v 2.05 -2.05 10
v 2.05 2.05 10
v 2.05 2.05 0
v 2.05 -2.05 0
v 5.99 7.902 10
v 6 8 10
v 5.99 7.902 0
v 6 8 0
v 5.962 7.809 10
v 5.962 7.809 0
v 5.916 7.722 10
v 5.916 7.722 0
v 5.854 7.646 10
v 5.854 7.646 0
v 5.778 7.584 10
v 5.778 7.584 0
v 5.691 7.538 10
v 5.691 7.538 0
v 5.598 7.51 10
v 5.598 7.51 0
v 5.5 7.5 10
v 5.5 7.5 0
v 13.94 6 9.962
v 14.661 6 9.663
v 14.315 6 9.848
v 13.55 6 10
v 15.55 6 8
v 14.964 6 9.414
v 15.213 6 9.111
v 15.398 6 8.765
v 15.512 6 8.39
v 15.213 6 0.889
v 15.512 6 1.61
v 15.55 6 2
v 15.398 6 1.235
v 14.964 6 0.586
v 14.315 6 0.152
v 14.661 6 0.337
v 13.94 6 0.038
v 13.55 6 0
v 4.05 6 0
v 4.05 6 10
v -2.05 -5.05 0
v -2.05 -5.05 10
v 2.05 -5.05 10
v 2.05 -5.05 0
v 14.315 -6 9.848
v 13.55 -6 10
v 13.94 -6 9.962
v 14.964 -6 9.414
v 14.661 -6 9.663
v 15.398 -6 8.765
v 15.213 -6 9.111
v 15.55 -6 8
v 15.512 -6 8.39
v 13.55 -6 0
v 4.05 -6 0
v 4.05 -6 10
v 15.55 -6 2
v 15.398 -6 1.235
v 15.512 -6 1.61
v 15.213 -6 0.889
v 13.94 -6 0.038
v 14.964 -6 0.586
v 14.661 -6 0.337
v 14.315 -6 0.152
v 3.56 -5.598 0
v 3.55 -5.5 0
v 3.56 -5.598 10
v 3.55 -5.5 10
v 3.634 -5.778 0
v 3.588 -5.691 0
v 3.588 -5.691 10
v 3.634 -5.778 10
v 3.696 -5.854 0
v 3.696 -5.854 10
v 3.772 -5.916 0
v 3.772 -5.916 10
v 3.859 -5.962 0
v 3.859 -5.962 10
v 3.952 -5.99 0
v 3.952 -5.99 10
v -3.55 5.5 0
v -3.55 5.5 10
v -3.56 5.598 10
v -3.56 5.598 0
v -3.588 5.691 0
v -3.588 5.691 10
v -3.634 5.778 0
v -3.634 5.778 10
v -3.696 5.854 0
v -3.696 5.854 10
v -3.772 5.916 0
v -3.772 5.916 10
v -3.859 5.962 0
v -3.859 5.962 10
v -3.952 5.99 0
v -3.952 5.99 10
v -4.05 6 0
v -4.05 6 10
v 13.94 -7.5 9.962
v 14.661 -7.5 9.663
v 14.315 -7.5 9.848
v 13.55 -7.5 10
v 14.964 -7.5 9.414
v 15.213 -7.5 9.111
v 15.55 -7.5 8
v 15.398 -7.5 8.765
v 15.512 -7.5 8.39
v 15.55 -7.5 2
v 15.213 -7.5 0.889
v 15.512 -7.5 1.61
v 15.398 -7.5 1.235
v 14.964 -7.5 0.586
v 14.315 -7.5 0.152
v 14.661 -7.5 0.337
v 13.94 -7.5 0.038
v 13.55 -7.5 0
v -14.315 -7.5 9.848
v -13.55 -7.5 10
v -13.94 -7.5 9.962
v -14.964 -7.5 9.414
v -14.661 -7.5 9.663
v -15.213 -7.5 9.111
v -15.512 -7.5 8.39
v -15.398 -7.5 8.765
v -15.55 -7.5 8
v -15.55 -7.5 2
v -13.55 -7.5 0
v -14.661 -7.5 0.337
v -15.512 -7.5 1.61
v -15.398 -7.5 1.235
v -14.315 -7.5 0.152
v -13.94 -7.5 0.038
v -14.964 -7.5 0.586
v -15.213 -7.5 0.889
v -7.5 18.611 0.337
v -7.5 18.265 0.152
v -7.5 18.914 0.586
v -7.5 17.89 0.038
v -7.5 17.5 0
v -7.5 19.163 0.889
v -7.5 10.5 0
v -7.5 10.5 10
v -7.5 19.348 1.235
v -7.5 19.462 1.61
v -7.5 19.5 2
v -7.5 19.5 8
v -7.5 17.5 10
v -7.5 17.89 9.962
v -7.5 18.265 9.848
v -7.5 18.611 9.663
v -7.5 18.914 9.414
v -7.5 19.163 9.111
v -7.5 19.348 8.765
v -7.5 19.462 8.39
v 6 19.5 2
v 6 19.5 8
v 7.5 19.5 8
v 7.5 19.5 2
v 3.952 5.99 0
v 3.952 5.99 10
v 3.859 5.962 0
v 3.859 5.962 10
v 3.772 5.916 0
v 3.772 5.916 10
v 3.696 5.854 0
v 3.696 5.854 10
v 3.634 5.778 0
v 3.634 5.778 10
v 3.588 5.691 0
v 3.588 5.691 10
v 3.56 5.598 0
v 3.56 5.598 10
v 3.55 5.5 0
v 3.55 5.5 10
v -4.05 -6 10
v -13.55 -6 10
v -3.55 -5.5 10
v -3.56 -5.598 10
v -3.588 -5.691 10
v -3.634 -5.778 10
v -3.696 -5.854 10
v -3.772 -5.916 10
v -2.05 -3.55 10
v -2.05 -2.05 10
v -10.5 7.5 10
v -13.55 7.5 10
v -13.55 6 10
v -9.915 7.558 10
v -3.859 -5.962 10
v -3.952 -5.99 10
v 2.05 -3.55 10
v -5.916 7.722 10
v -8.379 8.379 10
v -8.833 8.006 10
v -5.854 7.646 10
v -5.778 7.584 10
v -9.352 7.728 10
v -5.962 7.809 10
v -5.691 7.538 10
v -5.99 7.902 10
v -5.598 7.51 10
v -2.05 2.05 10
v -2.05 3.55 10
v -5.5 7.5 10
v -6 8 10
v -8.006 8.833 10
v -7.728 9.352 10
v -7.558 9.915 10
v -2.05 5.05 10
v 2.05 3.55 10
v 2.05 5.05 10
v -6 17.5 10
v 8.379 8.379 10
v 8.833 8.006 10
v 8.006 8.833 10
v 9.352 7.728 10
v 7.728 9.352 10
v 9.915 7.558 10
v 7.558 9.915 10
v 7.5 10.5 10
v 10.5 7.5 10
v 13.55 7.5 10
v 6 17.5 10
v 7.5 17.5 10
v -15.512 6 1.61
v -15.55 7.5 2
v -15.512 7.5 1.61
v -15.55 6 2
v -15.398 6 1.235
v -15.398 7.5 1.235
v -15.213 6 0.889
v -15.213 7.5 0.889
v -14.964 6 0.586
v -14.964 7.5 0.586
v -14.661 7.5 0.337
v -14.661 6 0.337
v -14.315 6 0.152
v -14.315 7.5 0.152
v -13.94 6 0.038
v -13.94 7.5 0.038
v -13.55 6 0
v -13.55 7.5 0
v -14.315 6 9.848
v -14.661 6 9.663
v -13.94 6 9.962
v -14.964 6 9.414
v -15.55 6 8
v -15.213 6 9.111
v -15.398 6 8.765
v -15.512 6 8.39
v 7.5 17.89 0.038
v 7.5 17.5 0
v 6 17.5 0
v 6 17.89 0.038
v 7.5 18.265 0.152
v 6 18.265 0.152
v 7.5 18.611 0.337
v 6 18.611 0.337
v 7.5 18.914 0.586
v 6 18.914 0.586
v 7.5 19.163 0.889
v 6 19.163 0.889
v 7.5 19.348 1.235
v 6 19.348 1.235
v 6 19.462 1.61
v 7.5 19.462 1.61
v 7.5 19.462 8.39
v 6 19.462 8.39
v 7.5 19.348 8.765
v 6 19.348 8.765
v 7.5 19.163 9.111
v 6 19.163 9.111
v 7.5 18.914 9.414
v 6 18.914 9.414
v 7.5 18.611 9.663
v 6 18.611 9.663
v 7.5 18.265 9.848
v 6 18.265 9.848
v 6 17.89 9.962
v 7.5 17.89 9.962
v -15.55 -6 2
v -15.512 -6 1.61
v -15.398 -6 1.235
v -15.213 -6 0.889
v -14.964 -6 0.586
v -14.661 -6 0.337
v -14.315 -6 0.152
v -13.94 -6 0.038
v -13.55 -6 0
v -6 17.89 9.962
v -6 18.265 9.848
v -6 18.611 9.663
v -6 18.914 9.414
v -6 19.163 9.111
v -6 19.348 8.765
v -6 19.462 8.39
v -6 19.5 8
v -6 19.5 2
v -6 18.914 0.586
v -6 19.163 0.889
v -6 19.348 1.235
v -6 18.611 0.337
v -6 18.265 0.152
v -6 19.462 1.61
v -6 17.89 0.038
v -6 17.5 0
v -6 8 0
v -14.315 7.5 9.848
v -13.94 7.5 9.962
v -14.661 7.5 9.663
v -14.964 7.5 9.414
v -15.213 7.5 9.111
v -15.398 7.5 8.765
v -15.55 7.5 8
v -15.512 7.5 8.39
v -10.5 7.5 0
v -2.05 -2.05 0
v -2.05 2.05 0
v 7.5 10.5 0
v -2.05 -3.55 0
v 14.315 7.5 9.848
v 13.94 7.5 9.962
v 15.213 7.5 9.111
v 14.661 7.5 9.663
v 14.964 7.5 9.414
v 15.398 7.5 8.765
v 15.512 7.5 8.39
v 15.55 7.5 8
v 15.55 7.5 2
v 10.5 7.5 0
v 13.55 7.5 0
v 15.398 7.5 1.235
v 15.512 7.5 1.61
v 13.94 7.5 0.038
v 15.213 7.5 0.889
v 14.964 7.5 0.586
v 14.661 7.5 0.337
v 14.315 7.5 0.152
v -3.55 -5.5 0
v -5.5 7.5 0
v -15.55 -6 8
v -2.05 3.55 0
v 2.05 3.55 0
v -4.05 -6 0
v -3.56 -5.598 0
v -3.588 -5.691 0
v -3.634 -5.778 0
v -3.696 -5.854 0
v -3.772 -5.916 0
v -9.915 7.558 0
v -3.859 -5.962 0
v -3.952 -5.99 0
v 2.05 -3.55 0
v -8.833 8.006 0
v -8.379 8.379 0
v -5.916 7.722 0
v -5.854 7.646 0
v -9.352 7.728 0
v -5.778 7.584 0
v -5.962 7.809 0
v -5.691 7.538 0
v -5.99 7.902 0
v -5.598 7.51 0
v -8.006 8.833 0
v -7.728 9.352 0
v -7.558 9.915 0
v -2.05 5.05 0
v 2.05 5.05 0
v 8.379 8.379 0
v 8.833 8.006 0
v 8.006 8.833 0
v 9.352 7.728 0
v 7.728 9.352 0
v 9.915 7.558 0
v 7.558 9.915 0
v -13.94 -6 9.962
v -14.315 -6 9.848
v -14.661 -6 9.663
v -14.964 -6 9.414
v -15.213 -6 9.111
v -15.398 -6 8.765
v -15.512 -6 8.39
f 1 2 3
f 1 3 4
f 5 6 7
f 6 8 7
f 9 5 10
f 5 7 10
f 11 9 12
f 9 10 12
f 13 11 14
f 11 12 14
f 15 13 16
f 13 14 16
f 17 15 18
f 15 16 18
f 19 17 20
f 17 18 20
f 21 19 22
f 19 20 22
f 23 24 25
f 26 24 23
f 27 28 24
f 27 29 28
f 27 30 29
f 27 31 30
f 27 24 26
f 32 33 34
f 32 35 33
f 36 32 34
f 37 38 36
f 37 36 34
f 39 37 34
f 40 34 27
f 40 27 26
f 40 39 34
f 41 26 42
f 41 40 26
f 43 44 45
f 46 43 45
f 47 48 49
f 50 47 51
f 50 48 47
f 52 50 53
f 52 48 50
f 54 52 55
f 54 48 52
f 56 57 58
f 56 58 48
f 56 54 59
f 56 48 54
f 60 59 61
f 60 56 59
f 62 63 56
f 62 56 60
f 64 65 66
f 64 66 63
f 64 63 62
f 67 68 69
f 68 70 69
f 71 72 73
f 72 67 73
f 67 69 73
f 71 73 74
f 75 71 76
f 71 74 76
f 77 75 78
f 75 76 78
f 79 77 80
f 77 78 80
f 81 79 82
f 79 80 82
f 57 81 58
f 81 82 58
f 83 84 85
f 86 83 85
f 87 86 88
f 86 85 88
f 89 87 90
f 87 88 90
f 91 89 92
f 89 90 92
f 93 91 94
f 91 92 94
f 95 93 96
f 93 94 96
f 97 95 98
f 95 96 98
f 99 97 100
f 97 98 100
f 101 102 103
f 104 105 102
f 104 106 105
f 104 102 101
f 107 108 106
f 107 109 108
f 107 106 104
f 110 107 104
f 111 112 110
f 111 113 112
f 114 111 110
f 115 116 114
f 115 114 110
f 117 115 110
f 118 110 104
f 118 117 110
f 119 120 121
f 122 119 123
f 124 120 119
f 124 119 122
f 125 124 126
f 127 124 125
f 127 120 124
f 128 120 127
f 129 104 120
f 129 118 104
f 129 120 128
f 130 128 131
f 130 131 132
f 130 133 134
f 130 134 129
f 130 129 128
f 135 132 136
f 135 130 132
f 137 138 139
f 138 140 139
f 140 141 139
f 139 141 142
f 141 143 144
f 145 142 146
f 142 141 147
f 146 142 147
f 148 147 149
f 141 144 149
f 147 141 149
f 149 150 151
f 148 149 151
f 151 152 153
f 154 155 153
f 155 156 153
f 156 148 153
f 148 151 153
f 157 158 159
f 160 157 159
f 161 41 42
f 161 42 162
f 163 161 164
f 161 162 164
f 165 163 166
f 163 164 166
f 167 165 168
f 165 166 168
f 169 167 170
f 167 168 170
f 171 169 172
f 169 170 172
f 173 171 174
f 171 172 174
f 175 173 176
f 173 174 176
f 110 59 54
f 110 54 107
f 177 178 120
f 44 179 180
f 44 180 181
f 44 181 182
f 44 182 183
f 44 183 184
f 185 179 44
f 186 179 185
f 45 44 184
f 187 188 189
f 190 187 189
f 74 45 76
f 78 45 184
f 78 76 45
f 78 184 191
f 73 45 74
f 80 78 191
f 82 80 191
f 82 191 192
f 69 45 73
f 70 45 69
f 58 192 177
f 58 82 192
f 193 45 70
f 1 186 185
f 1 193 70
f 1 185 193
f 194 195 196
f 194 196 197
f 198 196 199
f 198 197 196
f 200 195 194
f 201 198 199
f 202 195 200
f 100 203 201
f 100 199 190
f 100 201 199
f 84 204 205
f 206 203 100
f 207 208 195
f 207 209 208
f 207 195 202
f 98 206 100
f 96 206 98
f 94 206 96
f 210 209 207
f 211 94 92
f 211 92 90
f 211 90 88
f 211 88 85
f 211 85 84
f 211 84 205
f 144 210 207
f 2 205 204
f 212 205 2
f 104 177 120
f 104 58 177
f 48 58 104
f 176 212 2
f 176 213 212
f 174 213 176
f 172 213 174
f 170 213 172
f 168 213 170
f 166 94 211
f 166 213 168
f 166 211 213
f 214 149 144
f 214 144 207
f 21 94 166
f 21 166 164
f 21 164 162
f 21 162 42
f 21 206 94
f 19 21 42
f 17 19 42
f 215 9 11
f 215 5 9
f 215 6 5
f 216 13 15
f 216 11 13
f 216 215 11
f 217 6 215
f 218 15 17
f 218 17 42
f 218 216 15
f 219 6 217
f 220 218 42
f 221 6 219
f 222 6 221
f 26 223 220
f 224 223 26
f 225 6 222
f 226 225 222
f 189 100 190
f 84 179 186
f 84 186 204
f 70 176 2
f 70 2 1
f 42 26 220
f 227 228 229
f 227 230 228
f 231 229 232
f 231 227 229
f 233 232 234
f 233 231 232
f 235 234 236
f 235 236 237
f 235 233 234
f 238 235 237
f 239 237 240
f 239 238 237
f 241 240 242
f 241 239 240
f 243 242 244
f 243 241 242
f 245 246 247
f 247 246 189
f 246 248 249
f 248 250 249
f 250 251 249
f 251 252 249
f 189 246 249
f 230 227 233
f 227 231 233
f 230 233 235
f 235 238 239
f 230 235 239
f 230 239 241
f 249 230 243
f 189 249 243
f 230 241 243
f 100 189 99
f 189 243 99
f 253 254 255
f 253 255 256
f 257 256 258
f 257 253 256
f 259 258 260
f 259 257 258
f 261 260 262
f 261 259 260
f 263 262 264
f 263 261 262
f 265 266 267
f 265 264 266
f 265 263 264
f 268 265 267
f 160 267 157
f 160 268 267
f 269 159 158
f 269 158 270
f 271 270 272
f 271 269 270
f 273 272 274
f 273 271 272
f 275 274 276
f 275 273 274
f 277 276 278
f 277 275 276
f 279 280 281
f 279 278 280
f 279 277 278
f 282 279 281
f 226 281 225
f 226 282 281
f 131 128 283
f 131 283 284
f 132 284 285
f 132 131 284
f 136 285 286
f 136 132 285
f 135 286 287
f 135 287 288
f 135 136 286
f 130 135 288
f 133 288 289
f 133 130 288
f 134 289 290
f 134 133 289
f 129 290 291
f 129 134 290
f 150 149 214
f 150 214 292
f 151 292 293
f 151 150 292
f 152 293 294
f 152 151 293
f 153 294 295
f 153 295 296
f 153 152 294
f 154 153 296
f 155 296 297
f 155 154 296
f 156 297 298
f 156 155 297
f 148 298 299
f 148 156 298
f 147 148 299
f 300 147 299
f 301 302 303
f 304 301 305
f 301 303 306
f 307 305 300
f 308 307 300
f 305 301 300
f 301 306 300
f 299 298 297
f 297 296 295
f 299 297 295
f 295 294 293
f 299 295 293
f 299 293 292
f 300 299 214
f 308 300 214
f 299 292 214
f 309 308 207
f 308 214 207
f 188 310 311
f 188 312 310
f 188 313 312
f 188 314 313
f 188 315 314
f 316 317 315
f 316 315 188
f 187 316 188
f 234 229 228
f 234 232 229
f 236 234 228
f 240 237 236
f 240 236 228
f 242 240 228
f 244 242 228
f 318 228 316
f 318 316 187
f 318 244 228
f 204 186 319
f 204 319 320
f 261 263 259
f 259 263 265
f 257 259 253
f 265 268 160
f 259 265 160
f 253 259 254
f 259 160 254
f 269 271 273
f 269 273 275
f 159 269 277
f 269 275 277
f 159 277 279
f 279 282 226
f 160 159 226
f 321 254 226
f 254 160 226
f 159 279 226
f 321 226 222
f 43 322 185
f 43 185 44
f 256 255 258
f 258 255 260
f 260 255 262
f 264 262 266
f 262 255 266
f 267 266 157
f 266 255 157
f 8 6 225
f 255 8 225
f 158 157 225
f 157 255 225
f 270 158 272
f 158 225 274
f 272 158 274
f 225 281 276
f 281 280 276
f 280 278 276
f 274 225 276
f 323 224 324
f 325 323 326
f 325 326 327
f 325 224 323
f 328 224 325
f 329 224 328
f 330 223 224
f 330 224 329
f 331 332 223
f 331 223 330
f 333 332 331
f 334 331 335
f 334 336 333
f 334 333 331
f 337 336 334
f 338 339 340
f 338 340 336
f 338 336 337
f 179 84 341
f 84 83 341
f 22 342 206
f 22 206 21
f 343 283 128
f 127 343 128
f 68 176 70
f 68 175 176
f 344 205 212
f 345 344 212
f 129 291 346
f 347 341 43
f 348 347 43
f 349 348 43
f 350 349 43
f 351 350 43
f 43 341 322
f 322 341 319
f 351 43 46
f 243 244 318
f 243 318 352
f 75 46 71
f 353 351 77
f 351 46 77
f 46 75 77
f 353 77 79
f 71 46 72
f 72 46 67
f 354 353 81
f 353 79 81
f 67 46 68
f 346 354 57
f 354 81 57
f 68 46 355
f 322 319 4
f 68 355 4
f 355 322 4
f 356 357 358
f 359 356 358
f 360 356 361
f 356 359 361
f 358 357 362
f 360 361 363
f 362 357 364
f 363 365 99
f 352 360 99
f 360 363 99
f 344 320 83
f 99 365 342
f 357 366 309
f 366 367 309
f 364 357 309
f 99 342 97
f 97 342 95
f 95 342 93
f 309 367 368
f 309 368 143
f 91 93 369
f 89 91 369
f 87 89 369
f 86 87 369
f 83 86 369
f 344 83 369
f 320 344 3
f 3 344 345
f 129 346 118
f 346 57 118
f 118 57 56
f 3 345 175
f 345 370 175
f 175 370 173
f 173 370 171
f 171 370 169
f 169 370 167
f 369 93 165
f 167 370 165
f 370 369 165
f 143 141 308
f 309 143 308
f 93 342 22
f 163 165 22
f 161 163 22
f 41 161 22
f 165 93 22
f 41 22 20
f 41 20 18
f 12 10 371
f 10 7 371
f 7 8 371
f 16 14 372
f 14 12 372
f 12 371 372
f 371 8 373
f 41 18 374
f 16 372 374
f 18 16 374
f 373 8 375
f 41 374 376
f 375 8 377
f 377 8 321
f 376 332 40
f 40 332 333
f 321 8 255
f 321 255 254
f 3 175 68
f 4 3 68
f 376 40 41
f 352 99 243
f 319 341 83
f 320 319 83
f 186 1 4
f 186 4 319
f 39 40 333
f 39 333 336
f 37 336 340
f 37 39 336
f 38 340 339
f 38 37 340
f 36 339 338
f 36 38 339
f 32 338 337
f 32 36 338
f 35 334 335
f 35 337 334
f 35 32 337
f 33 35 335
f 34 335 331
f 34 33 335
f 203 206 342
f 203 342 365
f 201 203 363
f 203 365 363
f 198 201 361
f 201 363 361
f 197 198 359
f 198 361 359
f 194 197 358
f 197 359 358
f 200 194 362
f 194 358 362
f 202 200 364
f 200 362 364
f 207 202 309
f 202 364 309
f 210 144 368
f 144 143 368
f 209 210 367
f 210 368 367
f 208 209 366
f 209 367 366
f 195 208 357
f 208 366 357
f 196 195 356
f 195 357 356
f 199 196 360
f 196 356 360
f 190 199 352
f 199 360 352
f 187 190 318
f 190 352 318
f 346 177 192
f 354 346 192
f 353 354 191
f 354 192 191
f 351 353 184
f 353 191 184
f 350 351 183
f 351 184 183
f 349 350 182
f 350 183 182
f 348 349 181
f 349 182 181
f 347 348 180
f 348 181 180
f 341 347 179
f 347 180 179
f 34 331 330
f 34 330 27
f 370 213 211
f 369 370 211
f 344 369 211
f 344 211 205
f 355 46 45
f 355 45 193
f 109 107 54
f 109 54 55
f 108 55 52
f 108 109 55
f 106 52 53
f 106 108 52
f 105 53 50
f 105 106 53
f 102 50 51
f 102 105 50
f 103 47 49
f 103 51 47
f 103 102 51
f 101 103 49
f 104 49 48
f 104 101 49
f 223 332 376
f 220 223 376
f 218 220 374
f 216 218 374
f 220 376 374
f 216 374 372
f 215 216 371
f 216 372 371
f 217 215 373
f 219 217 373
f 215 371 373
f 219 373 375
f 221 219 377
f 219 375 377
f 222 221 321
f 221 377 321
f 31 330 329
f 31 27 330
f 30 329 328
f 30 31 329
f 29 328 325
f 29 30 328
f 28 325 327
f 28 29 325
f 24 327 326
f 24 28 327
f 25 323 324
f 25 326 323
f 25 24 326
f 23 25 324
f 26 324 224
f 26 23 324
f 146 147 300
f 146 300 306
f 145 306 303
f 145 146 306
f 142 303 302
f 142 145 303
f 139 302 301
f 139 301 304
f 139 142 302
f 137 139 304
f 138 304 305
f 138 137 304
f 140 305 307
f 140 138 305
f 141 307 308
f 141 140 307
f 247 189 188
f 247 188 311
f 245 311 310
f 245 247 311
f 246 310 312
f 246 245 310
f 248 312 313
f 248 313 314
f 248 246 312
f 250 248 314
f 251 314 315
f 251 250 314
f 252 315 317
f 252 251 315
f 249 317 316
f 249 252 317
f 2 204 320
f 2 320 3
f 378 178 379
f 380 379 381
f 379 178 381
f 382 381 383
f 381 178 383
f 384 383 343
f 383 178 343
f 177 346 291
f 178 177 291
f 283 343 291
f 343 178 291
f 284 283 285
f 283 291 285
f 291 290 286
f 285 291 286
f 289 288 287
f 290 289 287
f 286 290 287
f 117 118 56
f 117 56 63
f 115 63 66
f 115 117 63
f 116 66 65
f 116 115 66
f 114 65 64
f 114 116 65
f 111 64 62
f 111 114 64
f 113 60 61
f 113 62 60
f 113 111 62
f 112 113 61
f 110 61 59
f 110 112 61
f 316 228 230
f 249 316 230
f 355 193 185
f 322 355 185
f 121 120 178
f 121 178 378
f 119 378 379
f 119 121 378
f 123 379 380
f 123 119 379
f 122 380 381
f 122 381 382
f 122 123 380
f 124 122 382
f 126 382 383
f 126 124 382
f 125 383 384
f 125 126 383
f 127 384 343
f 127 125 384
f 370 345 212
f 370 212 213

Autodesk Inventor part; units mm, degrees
ref_plane "XZ Plane" through (0, 0, 0) normal (0, 1, 0) x (-1, 0, 0)
sketch "Sketch1" plane through (0, 0, 0) normal (0, 0, 1) x (1, 0, 0)
  line L0 (-2.05, 2.05) -> (2.05, 2.05)
  line L1 (2.05, 2.05) -> (2.05, -2.05)
  line L2 (2.05, -2.05) -> (-2.05, -2.05)
  line L3 (-2.05, -2.05) -> (-2.05, 2.05)
  line L4 (0, 2.05) -> (0, -2.05) construction
  line L5 (0, 7.5) -> (-15.55, 7.5)
  line L6 (-15.55, 7.5) -> (-15.55, 6)
  line L7 (-15.55, 6) -> (-3.55, 6)
  line L8 (-3.55, 6) -> (-3.55, -6)
  line L9 (-3.55, -6) -> (-15.55, -6)
  line L10 (-15.55, -6) -> (-15.55, -7.5)
  line L11 (-15.55, -7.5) -> (-0.55, -7.5)
  line L12 (-2.05, 0) -> (2.05, 0) construction
  line L13 (0, 7.5) -> (15.55, 7.5)
  line L14 (15.55, 7.5) -> (15.55, 6)
  line L15 (15.55, 6) -> (3.55, 6)
  line L16 (3.55, 6) -> (3.55, -6)
  line L17 (3.55, -6) -> (15.55, -6)
  line L18 (15.55, -6) -> (15.55, -7.5)
  line L19 (15.55, -7.5) -> (-0.55, -7.5)
  line L20 (-2.05, 2.05) -> (2.05, -2.05) construction
  line L21 (2.05, 2.05) -> (-2.05, -2.05) construction
  line L22 (0, 7.5) -> (0, 2.05) construction
  point P0 (0, 0)
  point P1 (0, 0)
  point P2 (0, 0)
  dimension "d3" = 4.1
  dimension "d4" = 4.1
  dimension "d5" = 12
  dimension "d6" = 1.5
  dimension "d7" = 1.5
  dimension "d8" = 5.45
  dimension "d9" = 5.45
  dimension "d10" = 1.5
  dimension "d11" = 12
  dimension "d37" = 15
extrude "Extrusion1" add sketch "Sketch1" along normal blind 10
sketch "Sketch5" plane through (0, 0, 10) normal (0, 0, 1) x (1, 0, 0)
  line L0 (6, 19.5) -> (7.5, 19.5)
  line L1 (7.5, 19.5) -> (7.5, 7.5)
  line L2 (7.5, 7.5) -> (6, 7.5)
  line L3 (6, 7.5) -> (6, 19.5)
  line L4 (15.55, 7.5) -> (-15.55, 7.5) projected
  line L5 (3.55, -6) -> (3.55, 6) projected
  line L6 (0, 0) -> (0, 23.4065) construction
  dimension "d41" = 1.5
  dimension "d42" = 12
  dimension "d47" = 6
extrude "Extrusion5" add sketch "Sketch5" against normal up to surface (10 mm away)
mirror "Mirror1" about plane through (0, 0, 0) normal (1, 0, 0) of "Extrusion5"
fillet "Fillet1" radius 3 2 edges at (-7.5, 7.5, 5) (7.5, 7.5, 5)
fillet "Fillet2" radius 0.5 6 edges at (-3.55, 6, 5) (-3.55, -6, 5) (3.55, -6, 5) (3.55, 6, 5) (-6, 7.5, 5) (6, 7.5, 5)
fillet "Fillet3" radius 2 12 edges at (-6.75, 19.5, 10) (-15.55, 6.75, 10) (-6.75, 19.5, 0) (6.75, 19.5, 0) (6.75, 19.5, 10) (15.55, 6.75, 10) (15.55, 6.75, 0) (15.55, -6.75, 0) (15.55, -6.75, 10) (-15.55, -6.75, 10) (-15.55, -6.75, 0) (-15.55, 6.75, 0)
sketch "Sketch7" plane through (0, 0, 0) normal (0, 0, -1) x (-1, 0, 0)
  line L0 (-2.05, 5.05) -> (2.05, 5.05)
  line L1 (2.05, 5.05) -> (2.05, 3.55)
  line L2 (2.05, 3.55) -> (-2.05, 3.55)
  line L3 (-2.05, 3.55) -> (-2.05, 5.05)
  line L4 (-2.05, -3.55) -> (2.05, -3.55)
  line L5 (2.05, -3.55) -> (2.05, -5.05)
  line L6 (2.05, -5.05) -> (-2.05, -5.05)
  line L7 (-2.05, -5.05) -> (-2.05, -3.55)
  line L8 (2.05, 2.05) -> (-2.05, 2.05) projected
  line L9 (-2.05, -2.05) -> (2.05, -2.05) projected
  line L10 (2.05, -2.05) -> (2.05, 2.05) projected
  line L11 (-2.05, 2.05) -> (-2.05, -2.05) projected
  point P0 (0, 0)
  dimension "d55" = 1.5
  dimension "d56" = 1.5
  dimension "d57" = 1.5
  dimension "d58" = 1.5
extrude "Extrusion7" cut sketch "Sketch7" against normal blind 10 contours L0 L1 L2 L3 | L4 L5 L6 L7
equation "\"d7\" = d6"
equation "\"d8\" = d9"
properties part number "fuselage_tail_interface_airfoiled" material "ABS Plastic"
